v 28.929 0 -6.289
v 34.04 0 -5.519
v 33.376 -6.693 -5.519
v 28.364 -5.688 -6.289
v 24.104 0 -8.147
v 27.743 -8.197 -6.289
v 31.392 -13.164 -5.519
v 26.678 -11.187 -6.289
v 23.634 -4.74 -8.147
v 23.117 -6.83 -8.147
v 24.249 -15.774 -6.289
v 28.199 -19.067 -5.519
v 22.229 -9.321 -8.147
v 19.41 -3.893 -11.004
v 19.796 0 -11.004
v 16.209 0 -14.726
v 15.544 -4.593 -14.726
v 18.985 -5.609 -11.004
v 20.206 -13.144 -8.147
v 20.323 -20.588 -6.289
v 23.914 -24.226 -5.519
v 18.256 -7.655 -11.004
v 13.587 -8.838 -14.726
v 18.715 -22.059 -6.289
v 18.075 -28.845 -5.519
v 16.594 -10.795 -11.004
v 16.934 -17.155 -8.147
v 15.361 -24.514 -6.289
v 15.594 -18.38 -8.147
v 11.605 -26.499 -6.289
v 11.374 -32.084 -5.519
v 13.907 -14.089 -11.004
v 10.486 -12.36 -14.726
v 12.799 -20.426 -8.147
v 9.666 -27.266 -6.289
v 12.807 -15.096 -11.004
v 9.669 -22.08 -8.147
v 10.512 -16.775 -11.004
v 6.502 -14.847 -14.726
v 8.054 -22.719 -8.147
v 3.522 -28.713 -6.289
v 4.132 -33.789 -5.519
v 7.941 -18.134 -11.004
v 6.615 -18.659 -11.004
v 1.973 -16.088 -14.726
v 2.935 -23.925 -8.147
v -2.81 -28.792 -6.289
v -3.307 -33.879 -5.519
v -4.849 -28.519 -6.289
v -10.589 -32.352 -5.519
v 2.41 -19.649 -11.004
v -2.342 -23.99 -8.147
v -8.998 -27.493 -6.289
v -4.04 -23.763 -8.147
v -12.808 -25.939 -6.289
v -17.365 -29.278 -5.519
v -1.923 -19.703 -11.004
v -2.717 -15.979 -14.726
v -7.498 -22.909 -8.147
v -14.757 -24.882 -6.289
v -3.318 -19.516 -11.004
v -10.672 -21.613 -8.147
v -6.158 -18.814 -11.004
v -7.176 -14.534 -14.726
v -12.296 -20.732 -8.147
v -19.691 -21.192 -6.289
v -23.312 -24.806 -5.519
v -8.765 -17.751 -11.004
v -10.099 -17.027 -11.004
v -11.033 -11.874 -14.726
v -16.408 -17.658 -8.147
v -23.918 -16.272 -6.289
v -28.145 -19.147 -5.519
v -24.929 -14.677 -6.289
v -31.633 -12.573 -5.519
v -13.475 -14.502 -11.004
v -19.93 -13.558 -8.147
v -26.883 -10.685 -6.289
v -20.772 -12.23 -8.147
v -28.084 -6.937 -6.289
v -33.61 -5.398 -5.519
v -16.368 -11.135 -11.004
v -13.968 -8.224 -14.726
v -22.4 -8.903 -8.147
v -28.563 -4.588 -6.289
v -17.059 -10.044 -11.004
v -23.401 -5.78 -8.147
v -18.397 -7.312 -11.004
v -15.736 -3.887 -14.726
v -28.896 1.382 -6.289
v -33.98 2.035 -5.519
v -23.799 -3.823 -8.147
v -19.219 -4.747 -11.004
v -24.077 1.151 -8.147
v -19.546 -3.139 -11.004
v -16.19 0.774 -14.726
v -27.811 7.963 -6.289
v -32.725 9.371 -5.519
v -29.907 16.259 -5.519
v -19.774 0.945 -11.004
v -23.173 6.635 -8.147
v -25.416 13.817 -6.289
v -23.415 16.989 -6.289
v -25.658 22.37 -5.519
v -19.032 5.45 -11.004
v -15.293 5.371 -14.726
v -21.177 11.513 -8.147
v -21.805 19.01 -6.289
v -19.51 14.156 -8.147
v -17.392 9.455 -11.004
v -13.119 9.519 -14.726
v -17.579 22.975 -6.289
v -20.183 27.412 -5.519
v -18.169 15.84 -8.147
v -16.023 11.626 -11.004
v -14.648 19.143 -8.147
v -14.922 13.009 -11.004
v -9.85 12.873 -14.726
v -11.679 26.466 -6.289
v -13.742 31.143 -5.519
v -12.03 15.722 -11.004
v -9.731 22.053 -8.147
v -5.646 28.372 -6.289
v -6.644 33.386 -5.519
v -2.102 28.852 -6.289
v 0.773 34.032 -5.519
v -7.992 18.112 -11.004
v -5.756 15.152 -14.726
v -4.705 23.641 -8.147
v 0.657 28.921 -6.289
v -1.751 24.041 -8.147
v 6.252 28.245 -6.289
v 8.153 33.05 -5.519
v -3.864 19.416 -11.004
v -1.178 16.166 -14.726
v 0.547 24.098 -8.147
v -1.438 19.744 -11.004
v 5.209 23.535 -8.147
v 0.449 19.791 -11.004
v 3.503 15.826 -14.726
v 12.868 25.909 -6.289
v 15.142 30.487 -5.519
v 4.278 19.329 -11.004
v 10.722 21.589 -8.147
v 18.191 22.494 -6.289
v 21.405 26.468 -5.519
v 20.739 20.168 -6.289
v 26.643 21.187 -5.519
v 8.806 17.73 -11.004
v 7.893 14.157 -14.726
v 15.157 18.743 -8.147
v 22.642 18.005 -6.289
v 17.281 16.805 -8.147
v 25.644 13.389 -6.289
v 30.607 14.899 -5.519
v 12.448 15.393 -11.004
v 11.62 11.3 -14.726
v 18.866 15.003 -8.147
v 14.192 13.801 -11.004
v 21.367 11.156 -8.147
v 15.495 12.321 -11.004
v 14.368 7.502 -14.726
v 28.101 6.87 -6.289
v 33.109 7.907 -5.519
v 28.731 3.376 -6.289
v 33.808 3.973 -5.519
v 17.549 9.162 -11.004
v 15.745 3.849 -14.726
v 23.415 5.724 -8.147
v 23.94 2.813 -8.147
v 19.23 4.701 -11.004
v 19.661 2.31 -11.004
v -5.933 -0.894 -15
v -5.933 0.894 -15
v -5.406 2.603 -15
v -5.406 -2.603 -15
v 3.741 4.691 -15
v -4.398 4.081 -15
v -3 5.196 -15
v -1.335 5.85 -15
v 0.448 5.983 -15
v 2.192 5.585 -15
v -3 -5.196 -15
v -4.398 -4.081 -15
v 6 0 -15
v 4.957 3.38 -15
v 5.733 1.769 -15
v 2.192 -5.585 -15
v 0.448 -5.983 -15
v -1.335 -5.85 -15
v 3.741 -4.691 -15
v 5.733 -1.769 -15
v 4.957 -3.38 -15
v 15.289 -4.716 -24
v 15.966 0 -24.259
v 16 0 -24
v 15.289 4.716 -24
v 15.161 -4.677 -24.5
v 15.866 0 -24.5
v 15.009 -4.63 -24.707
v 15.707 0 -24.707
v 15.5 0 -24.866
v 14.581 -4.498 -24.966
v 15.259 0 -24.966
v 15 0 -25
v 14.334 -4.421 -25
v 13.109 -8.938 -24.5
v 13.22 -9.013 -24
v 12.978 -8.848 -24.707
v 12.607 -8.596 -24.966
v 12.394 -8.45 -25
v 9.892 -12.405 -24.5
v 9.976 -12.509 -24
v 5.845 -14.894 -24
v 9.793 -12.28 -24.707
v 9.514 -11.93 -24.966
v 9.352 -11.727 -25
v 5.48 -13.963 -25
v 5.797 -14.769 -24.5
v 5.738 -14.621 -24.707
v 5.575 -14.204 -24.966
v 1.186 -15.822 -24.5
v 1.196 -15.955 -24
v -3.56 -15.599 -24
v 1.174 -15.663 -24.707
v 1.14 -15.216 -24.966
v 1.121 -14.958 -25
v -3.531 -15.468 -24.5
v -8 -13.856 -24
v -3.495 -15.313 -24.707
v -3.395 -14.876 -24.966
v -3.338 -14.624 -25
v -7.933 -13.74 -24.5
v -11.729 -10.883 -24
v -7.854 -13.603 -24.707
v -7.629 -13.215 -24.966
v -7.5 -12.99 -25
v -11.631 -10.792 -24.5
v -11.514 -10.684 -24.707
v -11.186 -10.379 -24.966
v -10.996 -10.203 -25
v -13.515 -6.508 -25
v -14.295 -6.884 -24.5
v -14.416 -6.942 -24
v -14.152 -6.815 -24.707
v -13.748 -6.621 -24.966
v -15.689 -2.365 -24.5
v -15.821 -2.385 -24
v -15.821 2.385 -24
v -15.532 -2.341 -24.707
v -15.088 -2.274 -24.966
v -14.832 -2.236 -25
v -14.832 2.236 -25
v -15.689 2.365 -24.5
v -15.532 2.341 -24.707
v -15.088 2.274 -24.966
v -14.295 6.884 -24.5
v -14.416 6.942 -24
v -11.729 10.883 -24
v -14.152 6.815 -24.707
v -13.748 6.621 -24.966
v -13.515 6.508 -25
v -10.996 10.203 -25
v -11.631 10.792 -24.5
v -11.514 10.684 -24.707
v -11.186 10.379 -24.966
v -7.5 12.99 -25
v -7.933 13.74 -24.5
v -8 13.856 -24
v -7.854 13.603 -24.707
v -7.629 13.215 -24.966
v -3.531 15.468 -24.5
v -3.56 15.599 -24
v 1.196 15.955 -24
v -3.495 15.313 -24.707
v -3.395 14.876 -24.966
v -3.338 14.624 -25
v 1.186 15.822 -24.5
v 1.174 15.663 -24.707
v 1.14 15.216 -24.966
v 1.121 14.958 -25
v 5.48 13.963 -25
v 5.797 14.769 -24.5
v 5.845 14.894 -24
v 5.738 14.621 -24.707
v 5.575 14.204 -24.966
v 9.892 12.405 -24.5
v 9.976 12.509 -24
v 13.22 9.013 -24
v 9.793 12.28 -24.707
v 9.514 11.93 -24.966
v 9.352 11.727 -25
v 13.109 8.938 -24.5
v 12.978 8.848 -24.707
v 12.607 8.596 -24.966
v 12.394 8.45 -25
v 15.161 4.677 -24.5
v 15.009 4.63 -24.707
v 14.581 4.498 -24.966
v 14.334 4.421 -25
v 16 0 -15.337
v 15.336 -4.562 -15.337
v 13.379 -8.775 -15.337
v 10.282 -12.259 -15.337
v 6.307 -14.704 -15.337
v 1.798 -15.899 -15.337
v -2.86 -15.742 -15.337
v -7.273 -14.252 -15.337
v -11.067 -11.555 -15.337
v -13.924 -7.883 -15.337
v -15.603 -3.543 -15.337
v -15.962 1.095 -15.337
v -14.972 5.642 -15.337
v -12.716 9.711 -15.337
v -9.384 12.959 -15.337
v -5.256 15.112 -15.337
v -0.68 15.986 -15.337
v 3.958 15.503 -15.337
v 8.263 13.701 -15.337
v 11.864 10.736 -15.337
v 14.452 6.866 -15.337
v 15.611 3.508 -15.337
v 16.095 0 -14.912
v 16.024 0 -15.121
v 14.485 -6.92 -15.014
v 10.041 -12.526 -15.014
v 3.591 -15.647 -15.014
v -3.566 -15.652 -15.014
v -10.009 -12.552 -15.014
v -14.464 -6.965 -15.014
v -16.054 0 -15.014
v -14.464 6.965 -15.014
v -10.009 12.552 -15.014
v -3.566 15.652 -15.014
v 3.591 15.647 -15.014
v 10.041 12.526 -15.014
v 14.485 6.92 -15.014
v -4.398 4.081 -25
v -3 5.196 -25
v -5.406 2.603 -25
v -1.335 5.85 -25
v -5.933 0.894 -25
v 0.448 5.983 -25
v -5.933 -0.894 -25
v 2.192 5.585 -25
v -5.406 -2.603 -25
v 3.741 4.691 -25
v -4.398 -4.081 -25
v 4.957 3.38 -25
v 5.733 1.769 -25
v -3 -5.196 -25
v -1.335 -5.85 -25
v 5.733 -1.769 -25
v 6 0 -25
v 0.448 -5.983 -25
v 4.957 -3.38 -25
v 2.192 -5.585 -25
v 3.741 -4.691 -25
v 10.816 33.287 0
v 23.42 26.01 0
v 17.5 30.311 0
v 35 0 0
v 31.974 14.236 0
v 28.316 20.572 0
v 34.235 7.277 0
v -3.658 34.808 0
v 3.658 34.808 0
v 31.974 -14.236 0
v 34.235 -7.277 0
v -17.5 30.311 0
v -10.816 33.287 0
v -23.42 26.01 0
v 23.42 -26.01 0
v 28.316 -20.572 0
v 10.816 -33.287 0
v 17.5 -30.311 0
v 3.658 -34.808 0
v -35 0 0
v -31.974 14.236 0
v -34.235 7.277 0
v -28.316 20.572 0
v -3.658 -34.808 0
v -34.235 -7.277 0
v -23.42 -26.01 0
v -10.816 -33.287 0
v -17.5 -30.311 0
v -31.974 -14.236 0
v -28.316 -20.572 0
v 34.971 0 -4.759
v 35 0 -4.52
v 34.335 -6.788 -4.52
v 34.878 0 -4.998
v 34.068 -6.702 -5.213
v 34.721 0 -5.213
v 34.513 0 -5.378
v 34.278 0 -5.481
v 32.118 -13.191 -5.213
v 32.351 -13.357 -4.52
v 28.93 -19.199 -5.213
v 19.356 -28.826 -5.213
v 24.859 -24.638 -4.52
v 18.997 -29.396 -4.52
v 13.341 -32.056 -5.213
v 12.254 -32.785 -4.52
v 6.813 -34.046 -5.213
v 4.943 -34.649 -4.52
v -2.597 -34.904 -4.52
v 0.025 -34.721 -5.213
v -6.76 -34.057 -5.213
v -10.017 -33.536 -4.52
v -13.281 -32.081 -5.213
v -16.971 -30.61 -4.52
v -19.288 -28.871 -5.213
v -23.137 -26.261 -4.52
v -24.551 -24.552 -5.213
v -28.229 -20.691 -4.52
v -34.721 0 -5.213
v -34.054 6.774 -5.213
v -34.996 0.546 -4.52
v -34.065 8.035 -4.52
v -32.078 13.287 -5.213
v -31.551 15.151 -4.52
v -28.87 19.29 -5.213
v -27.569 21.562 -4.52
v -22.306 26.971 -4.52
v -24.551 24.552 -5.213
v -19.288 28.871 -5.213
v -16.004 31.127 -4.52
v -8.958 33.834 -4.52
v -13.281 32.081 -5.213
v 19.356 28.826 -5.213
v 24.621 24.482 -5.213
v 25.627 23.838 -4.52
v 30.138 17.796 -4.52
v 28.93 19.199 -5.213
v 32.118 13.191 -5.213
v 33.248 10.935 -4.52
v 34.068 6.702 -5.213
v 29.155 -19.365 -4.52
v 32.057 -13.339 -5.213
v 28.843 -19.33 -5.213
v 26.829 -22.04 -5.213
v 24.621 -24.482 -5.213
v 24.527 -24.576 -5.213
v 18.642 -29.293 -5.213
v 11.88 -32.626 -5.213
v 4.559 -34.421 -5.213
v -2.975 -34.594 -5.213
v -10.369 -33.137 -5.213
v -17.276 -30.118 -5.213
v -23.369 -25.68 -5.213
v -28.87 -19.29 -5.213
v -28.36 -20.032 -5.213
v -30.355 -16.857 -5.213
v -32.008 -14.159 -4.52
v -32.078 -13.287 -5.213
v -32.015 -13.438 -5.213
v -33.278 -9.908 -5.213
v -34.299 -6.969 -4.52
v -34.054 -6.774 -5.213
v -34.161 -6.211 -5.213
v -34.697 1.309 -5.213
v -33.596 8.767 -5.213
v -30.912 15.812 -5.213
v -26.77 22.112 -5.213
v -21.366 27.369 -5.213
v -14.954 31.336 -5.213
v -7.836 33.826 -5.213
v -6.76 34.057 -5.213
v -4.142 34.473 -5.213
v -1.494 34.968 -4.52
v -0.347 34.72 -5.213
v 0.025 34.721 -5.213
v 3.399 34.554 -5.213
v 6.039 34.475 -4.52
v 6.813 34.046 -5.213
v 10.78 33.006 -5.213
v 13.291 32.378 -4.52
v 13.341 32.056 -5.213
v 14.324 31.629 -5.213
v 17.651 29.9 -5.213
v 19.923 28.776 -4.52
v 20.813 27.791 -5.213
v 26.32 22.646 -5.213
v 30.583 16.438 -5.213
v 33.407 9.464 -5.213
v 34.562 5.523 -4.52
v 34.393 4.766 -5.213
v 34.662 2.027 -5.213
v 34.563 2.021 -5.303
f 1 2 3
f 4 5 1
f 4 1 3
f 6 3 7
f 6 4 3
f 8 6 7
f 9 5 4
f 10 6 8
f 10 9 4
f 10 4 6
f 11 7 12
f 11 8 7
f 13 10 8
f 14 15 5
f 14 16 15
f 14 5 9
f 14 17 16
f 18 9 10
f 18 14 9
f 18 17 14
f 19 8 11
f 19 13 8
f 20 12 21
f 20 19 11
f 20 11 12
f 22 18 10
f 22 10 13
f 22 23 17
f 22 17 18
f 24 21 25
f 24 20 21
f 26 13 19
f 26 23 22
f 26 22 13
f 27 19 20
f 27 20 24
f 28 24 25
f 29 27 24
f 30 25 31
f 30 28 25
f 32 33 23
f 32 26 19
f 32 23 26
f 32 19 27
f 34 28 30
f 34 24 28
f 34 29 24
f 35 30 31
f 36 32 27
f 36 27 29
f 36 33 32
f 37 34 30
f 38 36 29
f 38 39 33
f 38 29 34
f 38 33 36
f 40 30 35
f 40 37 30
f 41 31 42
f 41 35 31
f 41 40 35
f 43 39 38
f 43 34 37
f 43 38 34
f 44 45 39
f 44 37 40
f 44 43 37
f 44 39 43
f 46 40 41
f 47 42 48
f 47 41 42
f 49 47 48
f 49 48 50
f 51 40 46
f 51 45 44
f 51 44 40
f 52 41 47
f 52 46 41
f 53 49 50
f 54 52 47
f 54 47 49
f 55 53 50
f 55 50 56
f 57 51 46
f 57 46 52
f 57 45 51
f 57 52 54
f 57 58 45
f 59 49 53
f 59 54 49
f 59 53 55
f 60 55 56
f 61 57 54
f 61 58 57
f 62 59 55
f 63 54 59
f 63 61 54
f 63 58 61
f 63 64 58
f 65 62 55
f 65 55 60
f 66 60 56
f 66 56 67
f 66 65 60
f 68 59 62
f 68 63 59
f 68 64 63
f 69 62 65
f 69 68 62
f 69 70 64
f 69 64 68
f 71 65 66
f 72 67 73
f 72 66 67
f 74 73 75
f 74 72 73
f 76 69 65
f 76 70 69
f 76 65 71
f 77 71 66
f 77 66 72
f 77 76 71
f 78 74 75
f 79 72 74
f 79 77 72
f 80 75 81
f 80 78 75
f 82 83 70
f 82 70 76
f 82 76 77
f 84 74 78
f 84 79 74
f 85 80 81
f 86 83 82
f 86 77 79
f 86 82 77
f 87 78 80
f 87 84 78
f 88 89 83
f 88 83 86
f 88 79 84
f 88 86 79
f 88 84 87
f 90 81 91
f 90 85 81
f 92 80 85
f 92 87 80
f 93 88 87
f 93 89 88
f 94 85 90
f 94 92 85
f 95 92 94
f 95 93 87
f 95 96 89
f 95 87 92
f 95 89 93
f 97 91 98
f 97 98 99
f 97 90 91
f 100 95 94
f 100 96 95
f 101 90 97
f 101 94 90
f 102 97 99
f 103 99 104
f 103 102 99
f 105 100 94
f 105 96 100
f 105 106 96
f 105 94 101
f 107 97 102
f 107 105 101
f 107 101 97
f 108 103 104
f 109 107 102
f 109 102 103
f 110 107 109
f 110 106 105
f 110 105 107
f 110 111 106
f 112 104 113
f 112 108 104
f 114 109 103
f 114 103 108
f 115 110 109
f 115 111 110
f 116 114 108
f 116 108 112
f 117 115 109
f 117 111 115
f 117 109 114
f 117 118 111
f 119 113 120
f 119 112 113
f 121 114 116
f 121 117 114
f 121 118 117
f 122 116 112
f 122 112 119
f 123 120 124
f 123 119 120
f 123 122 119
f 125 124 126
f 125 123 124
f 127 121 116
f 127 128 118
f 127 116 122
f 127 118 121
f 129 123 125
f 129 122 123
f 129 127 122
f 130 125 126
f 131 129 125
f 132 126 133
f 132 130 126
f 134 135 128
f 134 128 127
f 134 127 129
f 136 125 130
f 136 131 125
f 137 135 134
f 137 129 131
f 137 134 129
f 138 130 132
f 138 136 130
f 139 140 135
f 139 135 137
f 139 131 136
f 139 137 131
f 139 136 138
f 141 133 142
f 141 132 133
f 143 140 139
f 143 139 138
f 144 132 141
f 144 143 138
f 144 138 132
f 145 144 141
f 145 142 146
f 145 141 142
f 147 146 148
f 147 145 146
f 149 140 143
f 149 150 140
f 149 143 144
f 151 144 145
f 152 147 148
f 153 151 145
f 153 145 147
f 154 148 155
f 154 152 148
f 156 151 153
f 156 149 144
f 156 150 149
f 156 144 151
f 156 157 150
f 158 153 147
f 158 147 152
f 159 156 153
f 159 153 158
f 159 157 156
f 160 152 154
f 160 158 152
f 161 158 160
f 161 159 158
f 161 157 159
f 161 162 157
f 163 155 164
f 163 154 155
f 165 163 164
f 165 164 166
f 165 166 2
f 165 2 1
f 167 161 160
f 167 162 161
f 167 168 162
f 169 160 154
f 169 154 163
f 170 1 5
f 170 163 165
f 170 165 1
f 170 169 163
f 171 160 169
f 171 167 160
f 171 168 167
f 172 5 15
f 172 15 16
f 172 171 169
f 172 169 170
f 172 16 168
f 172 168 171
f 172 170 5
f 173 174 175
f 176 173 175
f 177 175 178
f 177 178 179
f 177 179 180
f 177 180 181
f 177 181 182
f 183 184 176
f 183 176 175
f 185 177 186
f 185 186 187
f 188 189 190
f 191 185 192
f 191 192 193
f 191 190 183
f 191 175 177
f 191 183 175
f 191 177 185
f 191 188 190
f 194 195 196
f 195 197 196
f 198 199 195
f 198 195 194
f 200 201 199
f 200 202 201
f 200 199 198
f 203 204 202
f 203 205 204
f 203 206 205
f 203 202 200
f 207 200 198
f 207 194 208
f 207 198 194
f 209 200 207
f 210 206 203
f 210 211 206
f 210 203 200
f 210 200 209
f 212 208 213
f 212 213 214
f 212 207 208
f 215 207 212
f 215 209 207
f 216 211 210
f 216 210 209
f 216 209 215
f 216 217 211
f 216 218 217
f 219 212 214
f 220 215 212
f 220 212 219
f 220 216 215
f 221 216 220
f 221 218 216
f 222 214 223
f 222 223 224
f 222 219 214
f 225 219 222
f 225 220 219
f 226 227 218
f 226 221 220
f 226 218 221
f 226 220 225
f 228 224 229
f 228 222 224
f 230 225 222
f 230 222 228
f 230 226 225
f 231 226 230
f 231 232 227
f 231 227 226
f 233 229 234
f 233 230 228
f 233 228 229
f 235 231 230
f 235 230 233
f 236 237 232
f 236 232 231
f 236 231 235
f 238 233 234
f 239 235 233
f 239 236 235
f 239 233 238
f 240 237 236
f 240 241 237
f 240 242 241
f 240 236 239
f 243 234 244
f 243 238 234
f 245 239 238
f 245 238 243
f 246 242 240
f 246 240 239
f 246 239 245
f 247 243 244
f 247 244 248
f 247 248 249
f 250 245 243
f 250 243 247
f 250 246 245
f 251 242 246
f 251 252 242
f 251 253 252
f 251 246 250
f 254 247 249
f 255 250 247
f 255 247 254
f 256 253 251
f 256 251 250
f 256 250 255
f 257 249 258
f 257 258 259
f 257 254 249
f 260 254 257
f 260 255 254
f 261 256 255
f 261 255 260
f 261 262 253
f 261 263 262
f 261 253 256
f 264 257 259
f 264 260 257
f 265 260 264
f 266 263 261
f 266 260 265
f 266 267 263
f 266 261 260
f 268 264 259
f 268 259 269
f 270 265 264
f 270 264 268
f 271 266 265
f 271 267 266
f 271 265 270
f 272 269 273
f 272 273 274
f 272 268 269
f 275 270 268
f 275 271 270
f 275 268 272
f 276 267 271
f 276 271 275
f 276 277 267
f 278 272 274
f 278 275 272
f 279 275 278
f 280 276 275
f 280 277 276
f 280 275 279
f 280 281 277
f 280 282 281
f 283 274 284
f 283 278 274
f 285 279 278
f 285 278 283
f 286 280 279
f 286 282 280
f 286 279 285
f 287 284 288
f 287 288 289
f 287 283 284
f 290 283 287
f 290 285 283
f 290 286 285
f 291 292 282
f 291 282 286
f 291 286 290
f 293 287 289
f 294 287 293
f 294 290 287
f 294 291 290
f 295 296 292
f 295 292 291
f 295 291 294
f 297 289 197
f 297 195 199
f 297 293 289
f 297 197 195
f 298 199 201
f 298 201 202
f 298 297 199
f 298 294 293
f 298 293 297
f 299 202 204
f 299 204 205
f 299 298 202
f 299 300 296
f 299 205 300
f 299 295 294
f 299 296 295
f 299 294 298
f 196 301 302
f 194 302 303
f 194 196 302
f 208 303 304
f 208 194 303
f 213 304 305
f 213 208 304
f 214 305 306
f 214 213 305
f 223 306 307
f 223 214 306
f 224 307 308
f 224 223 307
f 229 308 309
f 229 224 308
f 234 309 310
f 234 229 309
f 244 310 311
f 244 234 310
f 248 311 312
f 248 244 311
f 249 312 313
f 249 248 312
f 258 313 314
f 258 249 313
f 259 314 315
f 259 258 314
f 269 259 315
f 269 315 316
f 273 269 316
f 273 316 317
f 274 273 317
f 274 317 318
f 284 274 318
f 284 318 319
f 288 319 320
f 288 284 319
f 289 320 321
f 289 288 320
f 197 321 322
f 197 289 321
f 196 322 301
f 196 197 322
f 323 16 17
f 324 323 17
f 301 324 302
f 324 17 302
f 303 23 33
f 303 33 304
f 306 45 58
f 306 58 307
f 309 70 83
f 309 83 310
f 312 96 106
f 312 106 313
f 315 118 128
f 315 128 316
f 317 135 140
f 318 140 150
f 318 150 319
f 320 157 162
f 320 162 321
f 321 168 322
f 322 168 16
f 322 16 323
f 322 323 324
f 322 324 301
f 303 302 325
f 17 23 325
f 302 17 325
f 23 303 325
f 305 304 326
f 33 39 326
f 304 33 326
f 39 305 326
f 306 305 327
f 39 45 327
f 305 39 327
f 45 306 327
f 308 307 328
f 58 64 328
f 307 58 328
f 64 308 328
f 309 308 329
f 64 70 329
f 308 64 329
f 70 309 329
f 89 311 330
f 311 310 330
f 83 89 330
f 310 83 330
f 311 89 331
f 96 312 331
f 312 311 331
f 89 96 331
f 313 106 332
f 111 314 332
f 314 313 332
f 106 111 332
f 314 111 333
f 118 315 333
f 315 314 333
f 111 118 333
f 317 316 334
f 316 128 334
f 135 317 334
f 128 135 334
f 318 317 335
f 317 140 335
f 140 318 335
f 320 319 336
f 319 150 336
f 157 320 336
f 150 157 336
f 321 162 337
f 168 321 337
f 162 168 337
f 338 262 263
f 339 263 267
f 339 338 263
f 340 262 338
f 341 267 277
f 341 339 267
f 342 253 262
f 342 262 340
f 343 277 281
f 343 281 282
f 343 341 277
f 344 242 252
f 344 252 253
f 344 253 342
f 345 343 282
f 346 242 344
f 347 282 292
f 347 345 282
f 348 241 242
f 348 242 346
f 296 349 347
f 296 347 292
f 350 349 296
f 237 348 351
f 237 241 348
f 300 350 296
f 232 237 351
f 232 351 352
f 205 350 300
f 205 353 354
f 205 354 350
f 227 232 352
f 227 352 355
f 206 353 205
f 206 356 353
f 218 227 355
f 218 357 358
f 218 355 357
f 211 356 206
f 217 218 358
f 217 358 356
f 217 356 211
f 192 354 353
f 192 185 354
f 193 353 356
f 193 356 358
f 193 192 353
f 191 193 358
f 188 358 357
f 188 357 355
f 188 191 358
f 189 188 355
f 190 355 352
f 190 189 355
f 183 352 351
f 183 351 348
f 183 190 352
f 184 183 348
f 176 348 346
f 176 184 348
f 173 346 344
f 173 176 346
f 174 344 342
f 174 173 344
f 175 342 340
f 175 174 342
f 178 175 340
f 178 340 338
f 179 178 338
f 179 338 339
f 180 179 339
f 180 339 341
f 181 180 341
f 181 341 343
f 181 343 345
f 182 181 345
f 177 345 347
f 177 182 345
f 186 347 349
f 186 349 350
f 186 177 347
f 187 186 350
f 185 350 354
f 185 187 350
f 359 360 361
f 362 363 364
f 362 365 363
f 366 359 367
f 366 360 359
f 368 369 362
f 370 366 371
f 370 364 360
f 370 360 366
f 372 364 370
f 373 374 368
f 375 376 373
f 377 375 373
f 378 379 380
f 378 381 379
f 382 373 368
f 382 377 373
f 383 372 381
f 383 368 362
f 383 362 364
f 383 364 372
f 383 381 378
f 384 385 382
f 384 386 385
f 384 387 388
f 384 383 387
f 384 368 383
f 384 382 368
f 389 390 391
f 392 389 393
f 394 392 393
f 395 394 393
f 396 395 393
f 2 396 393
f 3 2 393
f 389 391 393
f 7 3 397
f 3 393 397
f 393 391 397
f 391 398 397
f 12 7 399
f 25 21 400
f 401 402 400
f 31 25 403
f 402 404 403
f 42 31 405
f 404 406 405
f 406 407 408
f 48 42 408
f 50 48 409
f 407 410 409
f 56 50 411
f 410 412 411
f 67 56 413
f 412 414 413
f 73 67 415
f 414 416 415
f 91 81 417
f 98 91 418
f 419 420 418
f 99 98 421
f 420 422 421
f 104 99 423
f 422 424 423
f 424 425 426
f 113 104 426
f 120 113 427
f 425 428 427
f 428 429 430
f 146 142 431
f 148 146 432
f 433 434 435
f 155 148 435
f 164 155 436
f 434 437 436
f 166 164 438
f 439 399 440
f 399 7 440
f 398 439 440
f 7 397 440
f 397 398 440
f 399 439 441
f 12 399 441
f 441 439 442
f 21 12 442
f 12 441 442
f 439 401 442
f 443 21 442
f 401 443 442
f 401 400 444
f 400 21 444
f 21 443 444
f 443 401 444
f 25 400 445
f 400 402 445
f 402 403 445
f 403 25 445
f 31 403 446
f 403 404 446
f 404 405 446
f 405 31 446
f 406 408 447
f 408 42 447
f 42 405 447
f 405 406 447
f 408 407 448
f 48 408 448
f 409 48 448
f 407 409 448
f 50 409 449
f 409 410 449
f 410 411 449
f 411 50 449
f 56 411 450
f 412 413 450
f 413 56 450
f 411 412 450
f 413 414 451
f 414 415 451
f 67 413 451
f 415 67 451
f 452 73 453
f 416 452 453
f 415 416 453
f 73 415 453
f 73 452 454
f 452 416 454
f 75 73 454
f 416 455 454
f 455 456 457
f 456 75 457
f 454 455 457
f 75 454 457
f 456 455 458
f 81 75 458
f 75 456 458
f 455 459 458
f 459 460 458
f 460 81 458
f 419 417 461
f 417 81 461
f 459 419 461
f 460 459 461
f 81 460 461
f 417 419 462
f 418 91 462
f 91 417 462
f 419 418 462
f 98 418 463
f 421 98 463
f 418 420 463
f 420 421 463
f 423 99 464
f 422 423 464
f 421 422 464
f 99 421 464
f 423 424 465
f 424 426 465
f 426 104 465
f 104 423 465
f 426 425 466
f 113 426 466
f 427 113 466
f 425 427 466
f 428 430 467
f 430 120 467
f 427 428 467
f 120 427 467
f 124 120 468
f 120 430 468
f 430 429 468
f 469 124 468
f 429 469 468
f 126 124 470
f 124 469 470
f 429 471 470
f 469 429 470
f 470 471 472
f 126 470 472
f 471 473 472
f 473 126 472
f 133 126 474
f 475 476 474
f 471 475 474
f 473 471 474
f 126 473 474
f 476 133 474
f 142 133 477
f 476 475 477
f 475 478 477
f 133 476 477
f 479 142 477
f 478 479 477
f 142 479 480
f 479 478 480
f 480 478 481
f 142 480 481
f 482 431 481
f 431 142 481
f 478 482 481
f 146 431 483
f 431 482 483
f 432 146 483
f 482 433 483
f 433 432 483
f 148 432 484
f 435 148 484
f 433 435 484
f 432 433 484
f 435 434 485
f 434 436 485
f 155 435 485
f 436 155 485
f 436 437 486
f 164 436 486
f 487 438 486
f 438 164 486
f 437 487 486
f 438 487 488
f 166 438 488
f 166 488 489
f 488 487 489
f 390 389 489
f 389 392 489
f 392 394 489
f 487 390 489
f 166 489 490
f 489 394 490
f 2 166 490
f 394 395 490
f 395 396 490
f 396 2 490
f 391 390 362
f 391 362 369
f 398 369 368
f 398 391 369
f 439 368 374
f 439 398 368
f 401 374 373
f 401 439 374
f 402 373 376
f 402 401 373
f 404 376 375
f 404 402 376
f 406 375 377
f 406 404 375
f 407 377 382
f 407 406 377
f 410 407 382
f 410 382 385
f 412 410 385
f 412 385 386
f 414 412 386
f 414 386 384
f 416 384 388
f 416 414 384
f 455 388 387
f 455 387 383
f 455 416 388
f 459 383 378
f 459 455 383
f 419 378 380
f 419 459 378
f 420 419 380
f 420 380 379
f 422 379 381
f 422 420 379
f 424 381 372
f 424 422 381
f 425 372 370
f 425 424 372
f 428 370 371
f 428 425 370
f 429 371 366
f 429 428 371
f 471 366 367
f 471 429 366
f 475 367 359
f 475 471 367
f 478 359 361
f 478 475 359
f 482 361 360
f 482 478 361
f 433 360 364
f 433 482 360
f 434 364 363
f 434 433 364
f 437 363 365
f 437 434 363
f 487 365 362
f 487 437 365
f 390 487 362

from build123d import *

# Parameters (mm, degrees)
FILLET1_R = 1


with BuildPart() as part:
    # Sketch1 → Revolve1 (revolve)
    with BuildSketch(Plane(origin=(0, 0, 0), x_dir=(1, 0, 0), z_dir=(0, 1, 0)), mode=Mode.PRIVATE) as revolve1_sk:
        with BuildLine():
            Line((0, 0), (-35, 0))
            Line((-35, 0), (-35, 5.5))
            ThreePointArc((-35, 5.5), (-24.378677107, 8.007354214), (-16, 15))
            Line((-16, 15), (-16, 25))
            Line((-16, 25), (-6, 25))
            Line((-6, 25), (-6, 15))
            Line((-6, 15), (0, 15))
            Line((0, 15), (0, 0))
        make_face()
    revolve(revolve1_sk.sketch.rotate(Axis((0, 0, 0), (0, 0, -1)), 180), axis=Axis((0, 0, 0), (0, 0, -1)))

    # Fillet1
    fillet1_edges = [part.edges().sort_by_distance(p)[0] for p in [
        (-35, 0, -5.5),
        (-16, 0, -15),
        (-16, 0, -25),
    ]]
    fillet(fillet1_edges, radius=FILLET1_R)


solid = part.part
